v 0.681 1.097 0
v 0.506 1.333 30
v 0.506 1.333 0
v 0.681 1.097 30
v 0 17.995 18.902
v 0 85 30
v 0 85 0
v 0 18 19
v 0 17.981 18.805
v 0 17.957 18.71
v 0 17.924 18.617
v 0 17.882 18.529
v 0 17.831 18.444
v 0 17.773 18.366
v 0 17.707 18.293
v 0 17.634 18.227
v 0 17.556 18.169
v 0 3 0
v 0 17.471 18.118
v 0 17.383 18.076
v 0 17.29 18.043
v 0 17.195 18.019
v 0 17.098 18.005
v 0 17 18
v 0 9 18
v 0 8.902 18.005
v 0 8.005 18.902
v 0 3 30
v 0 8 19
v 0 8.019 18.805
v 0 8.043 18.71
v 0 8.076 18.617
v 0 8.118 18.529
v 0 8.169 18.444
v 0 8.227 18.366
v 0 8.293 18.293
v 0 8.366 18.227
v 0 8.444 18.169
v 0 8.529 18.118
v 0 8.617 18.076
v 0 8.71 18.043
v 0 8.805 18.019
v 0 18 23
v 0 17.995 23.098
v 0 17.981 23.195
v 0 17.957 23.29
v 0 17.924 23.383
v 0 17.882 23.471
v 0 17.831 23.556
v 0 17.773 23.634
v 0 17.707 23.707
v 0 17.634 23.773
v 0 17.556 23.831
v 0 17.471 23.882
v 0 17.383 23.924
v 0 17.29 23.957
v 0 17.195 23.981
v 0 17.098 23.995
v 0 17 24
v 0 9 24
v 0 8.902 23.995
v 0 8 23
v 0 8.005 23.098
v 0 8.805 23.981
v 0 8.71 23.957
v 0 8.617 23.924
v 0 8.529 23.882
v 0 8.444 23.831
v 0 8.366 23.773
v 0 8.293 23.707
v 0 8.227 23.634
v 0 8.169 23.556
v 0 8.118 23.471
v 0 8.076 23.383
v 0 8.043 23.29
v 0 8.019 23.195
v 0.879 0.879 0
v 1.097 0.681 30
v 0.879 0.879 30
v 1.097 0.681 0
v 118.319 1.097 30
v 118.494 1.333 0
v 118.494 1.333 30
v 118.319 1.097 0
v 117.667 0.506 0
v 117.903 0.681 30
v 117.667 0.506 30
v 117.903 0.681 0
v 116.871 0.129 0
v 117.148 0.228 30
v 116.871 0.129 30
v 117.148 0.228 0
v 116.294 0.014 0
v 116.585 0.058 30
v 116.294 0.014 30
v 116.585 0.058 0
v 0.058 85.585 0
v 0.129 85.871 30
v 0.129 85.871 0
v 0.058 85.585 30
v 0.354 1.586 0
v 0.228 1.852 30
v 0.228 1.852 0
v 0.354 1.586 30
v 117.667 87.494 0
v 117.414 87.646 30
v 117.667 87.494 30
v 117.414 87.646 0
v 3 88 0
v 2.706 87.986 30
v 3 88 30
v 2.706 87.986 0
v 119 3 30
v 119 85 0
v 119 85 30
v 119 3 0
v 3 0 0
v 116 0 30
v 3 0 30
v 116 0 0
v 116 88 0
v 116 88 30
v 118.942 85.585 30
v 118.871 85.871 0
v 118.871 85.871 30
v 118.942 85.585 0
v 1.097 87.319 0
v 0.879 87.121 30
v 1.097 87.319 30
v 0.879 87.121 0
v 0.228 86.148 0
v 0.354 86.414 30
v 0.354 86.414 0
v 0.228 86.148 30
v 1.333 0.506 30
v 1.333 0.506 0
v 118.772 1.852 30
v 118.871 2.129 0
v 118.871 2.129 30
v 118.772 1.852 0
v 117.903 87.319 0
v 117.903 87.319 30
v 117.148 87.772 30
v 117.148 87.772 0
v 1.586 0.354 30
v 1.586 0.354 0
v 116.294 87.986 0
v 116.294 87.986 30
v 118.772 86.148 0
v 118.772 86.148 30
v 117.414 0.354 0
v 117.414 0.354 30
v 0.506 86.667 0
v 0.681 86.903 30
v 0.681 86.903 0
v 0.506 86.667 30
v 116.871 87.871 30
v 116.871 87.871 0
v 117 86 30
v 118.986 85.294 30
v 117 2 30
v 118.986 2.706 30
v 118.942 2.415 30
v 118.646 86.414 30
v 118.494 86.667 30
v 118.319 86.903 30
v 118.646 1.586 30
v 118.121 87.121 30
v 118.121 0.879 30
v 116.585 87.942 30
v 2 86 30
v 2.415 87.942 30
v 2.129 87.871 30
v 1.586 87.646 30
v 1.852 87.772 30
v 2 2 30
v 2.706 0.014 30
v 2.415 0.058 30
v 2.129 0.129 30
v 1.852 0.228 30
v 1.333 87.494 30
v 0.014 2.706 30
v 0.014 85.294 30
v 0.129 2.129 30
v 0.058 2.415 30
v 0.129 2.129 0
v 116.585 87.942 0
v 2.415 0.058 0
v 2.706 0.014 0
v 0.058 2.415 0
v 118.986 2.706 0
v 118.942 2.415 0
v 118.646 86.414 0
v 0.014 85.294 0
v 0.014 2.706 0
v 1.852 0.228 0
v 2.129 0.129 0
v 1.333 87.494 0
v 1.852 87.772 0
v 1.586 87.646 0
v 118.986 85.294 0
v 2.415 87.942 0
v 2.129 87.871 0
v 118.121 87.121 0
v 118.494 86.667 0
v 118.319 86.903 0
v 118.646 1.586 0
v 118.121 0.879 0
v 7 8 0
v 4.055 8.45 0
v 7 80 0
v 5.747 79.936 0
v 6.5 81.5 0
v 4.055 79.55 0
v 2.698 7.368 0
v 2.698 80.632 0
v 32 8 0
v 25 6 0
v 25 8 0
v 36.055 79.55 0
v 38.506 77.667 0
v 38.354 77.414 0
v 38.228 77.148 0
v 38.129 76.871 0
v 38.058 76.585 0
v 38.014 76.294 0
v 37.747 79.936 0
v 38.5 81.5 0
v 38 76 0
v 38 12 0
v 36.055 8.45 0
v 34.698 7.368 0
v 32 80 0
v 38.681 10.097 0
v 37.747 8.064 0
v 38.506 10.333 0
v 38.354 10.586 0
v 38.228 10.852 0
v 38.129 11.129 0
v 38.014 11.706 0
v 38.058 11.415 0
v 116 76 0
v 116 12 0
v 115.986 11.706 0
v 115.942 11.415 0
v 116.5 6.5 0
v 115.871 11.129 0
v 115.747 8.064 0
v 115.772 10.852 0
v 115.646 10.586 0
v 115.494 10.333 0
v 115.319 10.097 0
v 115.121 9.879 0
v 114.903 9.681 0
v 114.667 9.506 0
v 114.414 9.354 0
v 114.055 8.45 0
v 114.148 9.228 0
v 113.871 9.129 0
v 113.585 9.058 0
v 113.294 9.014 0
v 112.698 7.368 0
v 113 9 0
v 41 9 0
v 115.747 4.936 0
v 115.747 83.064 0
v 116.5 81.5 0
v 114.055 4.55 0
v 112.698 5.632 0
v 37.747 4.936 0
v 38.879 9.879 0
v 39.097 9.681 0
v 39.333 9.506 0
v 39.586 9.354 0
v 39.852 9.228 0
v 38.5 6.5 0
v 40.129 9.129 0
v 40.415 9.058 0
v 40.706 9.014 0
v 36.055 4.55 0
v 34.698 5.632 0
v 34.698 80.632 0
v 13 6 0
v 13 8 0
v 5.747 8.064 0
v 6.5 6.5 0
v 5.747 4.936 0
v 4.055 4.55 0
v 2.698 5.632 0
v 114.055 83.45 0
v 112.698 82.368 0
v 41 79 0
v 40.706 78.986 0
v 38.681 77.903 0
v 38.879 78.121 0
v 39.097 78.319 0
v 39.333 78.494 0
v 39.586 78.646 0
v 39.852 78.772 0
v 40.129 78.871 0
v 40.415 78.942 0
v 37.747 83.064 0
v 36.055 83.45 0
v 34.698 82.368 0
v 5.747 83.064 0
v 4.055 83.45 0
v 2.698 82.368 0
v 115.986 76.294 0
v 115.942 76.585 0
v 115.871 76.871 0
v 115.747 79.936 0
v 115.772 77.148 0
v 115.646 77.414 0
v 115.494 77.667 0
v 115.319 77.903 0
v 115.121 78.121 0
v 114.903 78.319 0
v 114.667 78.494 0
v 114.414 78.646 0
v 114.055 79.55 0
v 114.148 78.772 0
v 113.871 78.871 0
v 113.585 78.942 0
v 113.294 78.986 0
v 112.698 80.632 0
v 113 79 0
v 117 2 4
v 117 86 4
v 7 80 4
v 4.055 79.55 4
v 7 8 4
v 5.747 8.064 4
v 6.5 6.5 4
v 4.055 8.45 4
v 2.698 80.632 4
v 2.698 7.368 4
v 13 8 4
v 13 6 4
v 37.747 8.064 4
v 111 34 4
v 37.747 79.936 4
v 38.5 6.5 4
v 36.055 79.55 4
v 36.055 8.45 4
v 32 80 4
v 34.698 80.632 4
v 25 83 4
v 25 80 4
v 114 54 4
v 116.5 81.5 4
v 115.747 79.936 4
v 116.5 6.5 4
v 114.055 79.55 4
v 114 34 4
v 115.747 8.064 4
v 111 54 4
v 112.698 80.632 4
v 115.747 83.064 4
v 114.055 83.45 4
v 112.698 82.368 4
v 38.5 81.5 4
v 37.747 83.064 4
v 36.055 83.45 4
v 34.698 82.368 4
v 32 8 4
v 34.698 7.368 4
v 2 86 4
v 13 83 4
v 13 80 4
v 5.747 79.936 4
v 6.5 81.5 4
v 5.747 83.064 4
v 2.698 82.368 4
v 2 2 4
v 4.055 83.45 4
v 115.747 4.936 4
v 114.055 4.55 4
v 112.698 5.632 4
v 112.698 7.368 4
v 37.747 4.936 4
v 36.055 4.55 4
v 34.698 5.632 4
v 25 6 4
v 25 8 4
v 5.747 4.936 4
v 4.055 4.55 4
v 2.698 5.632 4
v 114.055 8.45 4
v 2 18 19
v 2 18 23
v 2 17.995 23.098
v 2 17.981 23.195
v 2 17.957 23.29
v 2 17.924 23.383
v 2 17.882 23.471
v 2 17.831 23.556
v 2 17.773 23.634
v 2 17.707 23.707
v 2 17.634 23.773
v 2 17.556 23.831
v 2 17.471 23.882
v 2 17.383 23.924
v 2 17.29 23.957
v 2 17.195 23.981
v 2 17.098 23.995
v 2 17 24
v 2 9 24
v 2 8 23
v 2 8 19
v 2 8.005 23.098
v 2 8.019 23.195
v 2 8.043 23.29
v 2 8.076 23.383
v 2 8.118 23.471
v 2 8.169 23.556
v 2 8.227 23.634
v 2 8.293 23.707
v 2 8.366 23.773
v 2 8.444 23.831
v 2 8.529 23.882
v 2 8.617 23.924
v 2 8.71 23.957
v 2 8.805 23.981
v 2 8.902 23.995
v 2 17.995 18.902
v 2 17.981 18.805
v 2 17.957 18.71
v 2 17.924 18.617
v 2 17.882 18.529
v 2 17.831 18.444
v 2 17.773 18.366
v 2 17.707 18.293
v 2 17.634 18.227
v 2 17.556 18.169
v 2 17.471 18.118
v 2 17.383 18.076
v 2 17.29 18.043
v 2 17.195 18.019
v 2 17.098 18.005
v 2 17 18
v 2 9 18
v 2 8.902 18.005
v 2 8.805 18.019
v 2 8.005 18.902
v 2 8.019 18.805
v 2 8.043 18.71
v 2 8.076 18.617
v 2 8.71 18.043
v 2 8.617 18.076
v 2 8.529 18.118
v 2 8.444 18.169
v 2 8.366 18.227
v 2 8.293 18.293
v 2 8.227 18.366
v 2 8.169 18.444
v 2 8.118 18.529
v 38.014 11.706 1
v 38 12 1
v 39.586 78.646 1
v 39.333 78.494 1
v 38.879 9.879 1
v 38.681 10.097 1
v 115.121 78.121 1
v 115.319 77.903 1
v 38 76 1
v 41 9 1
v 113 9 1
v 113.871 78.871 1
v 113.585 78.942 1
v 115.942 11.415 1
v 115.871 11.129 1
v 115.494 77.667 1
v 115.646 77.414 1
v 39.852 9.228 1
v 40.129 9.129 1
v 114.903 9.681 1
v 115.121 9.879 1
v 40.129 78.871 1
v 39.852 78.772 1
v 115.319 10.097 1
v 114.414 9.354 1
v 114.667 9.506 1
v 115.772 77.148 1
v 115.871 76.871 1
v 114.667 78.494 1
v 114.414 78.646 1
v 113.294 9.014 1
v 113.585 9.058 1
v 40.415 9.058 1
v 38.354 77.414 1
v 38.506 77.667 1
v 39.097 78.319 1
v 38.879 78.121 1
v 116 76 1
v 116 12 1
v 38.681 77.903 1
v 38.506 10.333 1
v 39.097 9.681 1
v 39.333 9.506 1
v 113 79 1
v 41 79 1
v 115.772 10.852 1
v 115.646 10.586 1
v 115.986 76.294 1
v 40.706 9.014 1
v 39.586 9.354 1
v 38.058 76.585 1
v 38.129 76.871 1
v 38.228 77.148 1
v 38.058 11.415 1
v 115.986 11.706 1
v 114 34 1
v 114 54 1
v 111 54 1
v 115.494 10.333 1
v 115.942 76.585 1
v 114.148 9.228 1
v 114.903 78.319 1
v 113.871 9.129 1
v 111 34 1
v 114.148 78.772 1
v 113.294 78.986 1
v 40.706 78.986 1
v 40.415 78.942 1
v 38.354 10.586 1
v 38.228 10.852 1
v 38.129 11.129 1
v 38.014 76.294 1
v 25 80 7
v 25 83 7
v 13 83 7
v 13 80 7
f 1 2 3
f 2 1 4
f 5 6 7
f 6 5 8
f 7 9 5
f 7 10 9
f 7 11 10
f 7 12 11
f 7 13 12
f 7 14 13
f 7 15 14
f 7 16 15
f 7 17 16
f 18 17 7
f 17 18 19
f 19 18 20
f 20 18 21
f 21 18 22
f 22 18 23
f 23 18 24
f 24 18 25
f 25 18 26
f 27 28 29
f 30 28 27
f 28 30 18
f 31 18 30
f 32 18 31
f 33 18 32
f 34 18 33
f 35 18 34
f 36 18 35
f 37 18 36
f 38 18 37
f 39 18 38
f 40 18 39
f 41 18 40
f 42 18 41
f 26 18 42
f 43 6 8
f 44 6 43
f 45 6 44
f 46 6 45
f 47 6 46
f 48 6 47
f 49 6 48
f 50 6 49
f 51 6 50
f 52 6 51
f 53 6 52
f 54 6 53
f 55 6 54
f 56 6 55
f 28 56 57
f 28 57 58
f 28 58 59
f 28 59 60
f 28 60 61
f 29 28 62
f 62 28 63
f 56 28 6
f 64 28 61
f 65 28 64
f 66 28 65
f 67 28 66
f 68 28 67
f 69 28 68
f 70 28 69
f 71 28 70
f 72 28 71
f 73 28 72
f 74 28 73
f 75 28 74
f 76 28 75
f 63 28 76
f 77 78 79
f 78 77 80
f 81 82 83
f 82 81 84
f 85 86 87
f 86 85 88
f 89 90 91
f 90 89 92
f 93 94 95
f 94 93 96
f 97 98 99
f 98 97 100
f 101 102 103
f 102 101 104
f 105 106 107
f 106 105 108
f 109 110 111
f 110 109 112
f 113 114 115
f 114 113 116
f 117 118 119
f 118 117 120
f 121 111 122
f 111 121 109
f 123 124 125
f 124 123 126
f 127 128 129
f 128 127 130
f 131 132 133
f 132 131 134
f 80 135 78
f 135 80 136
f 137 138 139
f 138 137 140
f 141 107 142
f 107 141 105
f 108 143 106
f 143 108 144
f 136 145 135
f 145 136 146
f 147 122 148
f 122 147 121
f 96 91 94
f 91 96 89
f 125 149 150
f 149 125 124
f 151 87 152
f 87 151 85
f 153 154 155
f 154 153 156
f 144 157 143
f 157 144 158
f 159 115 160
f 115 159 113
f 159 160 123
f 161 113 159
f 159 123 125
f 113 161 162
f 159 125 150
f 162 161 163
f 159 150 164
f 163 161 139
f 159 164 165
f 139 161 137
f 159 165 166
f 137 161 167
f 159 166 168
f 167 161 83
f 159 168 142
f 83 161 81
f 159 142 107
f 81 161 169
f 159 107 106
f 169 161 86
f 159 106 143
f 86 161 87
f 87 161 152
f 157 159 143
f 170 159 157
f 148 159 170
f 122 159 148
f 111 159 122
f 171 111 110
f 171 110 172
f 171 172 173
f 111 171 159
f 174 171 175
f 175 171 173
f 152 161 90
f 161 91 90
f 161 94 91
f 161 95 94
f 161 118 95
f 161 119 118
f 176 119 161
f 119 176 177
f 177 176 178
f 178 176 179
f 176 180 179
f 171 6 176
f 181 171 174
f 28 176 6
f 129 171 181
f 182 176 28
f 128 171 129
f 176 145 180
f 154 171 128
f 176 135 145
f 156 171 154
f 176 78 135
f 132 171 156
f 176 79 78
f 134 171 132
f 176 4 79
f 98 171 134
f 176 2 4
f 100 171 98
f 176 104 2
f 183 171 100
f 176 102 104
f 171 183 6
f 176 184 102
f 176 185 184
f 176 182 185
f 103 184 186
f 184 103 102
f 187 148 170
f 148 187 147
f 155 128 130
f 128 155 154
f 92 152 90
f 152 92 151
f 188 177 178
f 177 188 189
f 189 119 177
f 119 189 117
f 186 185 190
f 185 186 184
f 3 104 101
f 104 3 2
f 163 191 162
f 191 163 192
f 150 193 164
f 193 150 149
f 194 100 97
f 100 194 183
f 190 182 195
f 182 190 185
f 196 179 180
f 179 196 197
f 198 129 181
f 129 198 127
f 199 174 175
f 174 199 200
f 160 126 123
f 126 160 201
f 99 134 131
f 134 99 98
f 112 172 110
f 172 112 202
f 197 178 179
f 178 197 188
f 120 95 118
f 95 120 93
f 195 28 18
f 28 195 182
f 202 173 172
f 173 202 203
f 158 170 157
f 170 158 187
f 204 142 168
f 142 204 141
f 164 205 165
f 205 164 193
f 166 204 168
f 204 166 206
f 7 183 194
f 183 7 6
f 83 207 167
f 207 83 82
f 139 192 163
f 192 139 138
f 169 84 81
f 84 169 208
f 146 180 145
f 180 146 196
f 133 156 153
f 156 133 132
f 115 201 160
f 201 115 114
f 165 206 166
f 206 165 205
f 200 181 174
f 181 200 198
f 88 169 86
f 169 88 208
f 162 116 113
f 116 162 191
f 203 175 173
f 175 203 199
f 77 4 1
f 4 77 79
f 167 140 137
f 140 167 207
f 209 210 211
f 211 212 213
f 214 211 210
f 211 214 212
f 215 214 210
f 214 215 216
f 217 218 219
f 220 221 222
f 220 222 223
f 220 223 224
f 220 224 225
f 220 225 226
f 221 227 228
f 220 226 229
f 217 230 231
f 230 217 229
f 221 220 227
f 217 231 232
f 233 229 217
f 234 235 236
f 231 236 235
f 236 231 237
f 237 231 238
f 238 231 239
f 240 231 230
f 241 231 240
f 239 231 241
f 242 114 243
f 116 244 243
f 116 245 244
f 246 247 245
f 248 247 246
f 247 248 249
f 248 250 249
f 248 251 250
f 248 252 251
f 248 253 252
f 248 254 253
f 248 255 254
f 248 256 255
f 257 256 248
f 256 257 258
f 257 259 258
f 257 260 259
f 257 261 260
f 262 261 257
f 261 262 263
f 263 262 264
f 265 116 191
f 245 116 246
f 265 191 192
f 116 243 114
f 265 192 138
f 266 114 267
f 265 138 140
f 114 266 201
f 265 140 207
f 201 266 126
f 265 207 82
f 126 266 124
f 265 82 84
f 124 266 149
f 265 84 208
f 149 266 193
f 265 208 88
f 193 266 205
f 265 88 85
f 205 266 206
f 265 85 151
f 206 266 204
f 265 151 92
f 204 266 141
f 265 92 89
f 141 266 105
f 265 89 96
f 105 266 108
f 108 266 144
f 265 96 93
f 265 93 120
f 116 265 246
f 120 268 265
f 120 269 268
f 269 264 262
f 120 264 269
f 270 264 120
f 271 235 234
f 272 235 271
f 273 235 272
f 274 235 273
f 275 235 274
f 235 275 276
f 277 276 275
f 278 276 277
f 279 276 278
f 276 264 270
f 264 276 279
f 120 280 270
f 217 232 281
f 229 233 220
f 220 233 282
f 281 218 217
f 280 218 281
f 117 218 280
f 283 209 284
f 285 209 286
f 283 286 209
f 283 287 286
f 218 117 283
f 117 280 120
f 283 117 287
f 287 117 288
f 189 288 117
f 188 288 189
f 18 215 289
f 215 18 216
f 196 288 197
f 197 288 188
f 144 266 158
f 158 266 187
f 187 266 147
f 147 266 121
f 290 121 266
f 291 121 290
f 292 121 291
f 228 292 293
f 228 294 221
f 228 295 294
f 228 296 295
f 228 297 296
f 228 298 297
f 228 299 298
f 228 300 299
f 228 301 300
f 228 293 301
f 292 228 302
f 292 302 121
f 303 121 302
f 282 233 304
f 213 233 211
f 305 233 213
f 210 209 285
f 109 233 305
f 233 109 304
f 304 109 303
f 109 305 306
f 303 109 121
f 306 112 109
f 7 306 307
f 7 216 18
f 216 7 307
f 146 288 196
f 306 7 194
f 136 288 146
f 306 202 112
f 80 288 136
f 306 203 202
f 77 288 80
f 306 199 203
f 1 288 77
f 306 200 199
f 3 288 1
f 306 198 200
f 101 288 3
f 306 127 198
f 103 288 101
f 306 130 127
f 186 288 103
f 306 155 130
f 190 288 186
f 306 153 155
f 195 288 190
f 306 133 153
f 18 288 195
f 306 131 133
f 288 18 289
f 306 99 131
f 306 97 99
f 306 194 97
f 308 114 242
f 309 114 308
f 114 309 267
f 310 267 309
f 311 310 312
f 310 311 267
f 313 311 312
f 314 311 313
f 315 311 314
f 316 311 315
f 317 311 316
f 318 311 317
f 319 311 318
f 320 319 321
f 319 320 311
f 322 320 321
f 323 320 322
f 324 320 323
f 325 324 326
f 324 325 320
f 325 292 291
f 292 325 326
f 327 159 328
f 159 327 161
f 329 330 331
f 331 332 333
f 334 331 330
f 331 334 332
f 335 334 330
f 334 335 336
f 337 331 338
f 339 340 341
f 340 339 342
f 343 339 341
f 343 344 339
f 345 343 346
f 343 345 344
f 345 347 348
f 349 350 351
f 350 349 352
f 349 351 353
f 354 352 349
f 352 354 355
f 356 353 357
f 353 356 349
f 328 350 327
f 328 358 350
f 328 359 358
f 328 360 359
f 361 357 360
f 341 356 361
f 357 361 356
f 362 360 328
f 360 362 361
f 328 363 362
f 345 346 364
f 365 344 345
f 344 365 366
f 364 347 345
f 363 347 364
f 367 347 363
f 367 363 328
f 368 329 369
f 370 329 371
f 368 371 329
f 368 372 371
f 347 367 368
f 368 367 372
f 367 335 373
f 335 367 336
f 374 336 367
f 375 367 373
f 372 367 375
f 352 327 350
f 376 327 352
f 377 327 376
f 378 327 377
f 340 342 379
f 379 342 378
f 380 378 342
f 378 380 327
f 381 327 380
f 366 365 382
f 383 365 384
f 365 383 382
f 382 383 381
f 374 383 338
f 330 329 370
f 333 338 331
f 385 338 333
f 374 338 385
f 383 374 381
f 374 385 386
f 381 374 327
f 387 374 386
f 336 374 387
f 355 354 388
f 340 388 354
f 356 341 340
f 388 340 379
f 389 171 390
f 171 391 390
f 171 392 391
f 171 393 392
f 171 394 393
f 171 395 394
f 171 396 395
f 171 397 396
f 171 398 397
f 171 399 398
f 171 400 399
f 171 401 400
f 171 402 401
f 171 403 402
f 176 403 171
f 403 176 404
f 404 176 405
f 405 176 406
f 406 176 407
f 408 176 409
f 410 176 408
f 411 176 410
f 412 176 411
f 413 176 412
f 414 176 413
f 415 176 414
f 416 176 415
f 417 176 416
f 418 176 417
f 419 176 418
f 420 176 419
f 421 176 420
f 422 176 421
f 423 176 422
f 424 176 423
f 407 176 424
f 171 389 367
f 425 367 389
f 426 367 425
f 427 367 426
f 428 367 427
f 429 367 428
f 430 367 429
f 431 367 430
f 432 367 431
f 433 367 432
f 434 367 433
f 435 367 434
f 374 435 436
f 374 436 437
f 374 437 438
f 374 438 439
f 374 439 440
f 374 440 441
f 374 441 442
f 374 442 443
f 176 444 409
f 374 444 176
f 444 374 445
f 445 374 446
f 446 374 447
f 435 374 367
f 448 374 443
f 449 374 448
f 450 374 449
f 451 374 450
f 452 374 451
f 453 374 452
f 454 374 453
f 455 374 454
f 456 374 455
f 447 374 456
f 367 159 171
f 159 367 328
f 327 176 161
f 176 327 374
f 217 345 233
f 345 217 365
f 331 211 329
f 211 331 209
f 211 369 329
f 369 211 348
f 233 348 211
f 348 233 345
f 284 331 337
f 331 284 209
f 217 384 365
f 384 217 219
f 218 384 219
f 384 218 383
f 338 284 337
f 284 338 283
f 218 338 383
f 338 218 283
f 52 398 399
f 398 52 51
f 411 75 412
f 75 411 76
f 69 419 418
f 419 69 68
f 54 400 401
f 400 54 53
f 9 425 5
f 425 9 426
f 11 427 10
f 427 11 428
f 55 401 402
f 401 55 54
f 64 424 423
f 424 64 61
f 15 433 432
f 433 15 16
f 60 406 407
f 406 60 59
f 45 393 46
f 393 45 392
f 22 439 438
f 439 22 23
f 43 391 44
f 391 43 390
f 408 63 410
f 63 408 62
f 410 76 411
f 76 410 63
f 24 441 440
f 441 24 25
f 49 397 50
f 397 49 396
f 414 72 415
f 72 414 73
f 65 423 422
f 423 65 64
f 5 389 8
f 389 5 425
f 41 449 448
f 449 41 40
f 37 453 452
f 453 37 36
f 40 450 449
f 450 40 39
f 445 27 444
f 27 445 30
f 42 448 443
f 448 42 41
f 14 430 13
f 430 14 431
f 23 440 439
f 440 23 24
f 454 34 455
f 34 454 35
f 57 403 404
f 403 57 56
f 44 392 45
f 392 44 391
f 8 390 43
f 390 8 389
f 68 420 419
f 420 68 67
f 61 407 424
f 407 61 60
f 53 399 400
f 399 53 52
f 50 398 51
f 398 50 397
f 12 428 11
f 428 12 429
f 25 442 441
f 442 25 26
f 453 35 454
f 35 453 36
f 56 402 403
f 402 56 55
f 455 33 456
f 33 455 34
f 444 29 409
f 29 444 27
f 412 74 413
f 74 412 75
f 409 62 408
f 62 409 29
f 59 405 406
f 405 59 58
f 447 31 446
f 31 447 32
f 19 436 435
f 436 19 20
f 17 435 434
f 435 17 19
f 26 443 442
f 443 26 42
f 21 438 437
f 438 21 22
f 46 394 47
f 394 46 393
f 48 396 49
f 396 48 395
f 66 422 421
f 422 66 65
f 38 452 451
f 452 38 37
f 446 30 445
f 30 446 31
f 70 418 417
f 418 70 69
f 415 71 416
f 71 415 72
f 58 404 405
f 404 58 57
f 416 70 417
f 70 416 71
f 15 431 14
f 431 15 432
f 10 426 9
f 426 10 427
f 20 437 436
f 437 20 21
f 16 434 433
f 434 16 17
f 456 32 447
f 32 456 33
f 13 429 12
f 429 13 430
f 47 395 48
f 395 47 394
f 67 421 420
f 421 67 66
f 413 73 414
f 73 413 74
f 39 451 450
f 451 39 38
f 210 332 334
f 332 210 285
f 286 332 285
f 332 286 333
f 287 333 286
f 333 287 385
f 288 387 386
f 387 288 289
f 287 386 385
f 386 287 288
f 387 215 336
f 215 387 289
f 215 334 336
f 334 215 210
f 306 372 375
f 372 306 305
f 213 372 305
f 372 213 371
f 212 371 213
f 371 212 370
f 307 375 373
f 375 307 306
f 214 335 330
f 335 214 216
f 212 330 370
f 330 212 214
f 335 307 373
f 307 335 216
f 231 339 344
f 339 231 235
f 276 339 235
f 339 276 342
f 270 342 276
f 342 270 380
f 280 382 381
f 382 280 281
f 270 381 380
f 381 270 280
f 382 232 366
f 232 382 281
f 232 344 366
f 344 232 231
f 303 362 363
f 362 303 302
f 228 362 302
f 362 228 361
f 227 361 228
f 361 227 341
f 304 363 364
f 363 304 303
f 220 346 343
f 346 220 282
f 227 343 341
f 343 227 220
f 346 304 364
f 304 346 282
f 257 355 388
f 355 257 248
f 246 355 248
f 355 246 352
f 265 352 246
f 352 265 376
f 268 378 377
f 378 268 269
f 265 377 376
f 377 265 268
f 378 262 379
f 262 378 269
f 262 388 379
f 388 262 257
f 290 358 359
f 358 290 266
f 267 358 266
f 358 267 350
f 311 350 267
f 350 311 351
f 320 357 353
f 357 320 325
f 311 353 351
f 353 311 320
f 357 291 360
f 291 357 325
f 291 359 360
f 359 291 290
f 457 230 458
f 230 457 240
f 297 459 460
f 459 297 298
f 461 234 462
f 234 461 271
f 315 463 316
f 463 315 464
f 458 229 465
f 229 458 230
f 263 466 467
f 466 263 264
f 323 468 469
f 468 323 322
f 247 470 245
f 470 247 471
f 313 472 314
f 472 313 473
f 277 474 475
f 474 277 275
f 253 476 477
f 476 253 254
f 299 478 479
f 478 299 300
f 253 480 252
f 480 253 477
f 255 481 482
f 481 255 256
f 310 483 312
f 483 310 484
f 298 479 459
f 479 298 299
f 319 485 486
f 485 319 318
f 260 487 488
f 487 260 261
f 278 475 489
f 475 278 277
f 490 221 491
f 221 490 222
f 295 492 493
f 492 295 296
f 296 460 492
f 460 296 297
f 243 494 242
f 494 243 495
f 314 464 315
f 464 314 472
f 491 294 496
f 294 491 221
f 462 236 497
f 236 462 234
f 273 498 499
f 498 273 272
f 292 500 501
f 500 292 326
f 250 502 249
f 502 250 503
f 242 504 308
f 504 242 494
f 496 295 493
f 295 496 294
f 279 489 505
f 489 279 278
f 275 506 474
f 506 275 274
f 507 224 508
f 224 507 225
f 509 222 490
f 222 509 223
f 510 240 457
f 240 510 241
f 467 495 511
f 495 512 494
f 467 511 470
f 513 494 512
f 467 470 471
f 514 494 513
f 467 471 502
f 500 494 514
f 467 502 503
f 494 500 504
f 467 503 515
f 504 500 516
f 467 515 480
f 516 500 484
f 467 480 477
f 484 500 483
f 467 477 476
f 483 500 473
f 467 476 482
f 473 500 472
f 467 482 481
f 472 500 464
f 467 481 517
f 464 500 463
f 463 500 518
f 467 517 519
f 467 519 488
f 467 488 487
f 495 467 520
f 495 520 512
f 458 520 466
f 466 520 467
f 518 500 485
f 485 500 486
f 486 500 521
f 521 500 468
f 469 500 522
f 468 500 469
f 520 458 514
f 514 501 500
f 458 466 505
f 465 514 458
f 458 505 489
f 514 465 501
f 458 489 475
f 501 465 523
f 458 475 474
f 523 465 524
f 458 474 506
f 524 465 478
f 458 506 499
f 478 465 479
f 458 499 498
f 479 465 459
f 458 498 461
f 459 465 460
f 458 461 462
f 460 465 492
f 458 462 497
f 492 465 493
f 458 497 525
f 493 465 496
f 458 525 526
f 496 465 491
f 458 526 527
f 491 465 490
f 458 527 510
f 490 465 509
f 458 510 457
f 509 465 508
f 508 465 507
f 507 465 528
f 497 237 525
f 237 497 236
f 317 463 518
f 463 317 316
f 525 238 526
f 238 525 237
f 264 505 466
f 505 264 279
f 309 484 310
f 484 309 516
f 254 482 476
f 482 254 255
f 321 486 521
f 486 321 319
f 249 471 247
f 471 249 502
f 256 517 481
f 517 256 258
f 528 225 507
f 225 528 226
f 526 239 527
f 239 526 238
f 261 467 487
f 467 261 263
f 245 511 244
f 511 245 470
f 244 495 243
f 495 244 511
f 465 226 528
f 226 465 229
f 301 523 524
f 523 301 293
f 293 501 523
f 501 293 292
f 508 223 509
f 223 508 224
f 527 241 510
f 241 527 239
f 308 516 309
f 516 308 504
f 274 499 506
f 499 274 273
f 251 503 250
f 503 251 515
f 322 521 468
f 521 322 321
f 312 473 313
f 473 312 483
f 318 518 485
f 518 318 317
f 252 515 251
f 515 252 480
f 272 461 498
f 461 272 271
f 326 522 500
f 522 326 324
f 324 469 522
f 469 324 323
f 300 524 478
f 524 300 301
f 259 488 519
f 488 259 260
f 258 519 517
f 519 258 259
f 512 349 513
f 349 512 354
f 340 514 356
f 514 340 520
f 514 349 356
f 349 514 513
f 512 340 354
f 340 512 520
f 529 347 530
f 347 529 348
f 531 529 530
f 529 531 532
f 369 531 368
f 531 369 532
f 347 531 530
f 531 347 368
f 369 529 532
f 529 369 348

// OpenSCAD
union() {
    difference() {
        // Box:
        roundedcube(119, 88, 30, 3);
        translate([2, 2, 4])
            cube([115, 84, 28]);
        
        // LCD cutout:
        translate([7, 8, -2])
            cube([25, 72, 7]);
        // LCD circuit notch:
        // FIXME: make the shape tighter to the actual part (45⁰ angles)
        translate([13, 6, -2])
            cube([12, 3, 7]);
        
        // USB power cable cutout:
        translate([-1, 8, 24])
            rotate([0, 90, 0])
                roundedcube(6, 10, 5, 1);
        
        // Screw holes (LCD):
        translate([4.5, 6.5, -1])
            cylinder(h=6, r=2);
        translate([4.5, 81.5, -1])
            cylinder(h=6, r=2);
        translate([36.5, 6.5, -1])
            cylinder(h=6, r=2);
        translate([36.5, 81.5, -1])
            cylinder(h=6, r=2);
        
        // Screw holes (bottom):
        translate([114.5, 6.5, -1])
            cylinder(h=6, r=2);
        translate([114.5, 81.5, -1])
            cylinder(h=6, r=2);
        
        // Keypad space
        translate([38, 9, -1])
            roundedcube(78, 70, 2, 3);
        
        // Keypad cable cutout
        translate([111, 34, 0])
            cube([3, 20, 6]);
    }

    // LCD support post
    translate([13,80,4])
        cube([12, 3, 3]);
    
/*
    // Text:
    translate([0, 80, 8])
        rotate([90, 0, 270])
            linear_extrude(1)
                text("UDL Dryer 2.0", font="Existence", size=5);
*/
}

module roundedcube(xdim, ydim, zdim, rdim) {
    $fn=64;
    hull() {
        translate([rdim, rdim, 0])
            cylinder(r=rdim, h=zdim);
        translate([xdim-rdim, rdim, 0])
            cylinder(r=rdim, h=zdim);
        translate([rdim, ydim-rdim, 0])
            cylinder(r=rdim, h=zdim);
        translate([xdim-rdim, ydim-rdim, 0])
            cylinder(r=rdim, h=zdim);
    }
}
